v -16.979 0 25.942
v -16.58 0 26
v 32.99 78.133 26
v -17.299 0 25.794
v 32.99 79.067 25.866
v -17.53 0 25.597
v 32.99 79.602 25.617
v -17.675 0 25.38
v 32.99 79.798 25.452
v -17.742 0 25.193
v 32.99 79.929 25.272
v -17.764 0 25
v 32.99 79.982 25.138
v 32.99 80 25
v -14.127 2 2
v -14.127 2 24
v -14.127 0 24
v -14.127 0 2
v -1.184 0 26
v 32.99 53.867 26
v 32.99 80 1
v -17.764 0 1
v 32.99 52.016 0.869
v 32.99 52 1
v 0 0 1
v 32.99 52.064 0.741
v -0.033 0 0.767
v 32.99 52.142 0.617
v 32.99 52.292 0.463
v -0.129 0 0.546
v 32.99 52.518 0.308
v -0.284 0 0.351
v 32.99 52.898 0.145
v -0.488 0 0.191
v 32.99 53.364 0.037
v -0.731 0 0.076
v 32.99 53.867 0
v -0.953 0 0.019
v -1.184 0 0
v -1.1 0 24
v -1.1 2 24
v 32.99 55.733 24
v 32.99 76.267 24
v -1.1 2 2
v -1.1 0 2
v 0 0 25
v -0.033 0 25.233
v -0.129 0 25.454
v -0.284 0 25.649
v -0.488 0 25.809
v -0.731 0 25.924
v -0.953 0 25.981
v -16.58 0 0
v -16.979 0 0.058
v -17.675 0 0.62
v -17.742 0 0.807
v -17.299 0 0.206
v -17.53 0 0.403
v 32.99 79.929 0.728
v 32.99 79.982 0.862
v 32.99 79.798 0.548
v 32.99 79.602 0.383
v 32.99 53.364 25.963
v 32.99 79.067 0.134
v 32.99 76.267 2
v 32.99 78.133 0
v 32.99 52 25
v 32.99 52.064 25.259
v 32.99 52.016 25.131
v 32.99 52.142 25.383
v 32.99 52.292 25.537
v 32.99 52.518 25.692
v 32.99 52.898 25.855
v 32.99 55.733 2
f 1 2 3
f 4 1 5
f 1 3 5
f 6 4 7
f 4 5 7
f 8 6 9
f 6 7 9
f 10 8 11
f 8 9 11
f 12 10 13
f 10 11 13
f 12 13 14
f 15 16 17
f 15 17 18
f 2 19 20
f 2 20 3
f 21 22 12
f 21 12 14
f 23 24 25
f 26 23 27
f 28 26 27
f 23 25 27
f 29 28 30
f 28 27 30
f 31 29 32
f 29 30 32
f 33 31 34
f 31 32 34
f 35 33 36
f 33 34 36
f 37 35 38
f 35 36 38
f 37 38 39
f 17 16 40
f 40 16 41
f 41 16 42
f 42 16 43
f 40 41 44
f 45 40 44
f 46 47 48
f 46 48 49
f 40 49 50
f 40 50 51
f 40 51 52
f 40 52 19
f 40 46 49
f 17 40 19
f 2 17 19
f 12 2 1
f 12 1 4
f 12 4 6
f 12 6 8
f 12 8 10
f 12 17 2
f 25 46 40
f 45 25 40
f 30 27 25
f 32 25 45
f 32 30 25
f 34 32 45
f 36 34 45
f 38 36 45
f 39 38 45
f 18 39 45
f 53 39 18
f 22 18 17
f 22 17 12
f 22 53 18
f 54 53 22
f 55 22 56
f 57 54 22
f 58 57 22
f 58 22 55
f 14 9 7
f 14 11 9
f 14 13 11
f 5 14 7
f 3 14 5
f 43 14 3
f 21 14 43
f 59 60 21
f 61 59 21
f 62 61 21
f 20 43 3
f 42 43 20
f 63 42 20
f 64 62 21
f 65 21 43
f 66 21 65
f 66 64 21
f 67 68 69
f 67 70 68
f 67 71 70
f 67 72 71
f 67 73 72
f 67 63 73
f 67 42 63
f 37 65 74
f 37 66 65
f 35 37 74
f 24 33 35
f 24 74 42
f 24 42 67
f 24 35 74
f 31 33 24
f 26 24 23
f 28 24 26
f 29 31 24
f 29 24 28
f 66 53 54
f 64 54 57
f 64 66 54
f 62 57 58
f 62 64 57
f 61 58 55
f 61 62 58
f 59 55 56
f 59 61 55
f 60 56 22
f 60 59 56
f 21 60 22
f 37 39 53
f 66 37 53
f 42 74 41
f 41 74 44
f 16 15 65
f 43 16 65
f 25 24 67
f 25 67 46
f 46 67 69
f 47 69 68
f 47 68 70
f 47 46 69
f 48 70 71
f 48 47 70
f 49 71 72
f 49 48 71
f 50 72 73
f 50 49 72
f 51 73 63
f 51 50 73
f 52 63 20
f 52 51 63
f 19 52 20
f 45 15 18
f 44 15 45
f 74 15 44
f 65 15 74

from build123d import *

# Parameters (mm, degrees)
BOSS_EXTRUDE1_DEPTH = 26
SHELL1_T            = -2
CUT_EXTRUDE1_REACH  = 90.591
SKETCH2_W           = 13.02701198
SKETCH2_H           = 22
FILLET1_R           = 1


with BuildPart() as part:
    # Sketch1 → Boss-Extrude1 (new body)
    with BuildSketch(Plane.XY):
        Polygon((0, 0), (-17.764107246, 0), (32.990484886, 80), (32.990484886, 52), align=None)
    extrude(amount=BOSS_EXTRUDE1_DEPTH)

    # Shell1
    shell1_openings = [part.faces().sort_by_distance(p)[0] for p in [
        (32.990484886, 66, 13),
    ]]
    offset(amount=SHELL1_T, openings=shell1_openings, kind=Kind.INTERSECTION)

    # Sketch2 → Cut-Extrude1 (cut, up to next)
    with BuildSketch(Plane(origin=(0, 2, 0), x_dir=(1, 0, 0), z_dir=(0, 1, 0)), mode=Mode.PRIVATE) as cut_extrude1_sk1:
        with Locations((-7.61318882, -13)):
            Rectangle(SKETCH2_W, SKETCH2_H)
    cut_extrude1_tool1 = extrude(cut_extrude1_sk1.sketch, amount=-CUT_EXTRUDE1_REACH, mode=Mode.PRIVATE) & part.part
    add(cut_extrude1_tool1.solids().sort_by_distance((-7.613189, 2, 13))[0], mode=Mode.SUBTRACT)

    # Fillet1
    fillet1_edges = [part.edges().sort_by_distance(p)[0] for p in [
        (7.61318882, 40, 26),
        (16.495242443, 26, 26),
        (7.61318882, 40, 0),
        (16.495242443, 26, 0),
    ]]
    fillet(fillet1_edges, radius=FILLET1_R)


solid = part.part
